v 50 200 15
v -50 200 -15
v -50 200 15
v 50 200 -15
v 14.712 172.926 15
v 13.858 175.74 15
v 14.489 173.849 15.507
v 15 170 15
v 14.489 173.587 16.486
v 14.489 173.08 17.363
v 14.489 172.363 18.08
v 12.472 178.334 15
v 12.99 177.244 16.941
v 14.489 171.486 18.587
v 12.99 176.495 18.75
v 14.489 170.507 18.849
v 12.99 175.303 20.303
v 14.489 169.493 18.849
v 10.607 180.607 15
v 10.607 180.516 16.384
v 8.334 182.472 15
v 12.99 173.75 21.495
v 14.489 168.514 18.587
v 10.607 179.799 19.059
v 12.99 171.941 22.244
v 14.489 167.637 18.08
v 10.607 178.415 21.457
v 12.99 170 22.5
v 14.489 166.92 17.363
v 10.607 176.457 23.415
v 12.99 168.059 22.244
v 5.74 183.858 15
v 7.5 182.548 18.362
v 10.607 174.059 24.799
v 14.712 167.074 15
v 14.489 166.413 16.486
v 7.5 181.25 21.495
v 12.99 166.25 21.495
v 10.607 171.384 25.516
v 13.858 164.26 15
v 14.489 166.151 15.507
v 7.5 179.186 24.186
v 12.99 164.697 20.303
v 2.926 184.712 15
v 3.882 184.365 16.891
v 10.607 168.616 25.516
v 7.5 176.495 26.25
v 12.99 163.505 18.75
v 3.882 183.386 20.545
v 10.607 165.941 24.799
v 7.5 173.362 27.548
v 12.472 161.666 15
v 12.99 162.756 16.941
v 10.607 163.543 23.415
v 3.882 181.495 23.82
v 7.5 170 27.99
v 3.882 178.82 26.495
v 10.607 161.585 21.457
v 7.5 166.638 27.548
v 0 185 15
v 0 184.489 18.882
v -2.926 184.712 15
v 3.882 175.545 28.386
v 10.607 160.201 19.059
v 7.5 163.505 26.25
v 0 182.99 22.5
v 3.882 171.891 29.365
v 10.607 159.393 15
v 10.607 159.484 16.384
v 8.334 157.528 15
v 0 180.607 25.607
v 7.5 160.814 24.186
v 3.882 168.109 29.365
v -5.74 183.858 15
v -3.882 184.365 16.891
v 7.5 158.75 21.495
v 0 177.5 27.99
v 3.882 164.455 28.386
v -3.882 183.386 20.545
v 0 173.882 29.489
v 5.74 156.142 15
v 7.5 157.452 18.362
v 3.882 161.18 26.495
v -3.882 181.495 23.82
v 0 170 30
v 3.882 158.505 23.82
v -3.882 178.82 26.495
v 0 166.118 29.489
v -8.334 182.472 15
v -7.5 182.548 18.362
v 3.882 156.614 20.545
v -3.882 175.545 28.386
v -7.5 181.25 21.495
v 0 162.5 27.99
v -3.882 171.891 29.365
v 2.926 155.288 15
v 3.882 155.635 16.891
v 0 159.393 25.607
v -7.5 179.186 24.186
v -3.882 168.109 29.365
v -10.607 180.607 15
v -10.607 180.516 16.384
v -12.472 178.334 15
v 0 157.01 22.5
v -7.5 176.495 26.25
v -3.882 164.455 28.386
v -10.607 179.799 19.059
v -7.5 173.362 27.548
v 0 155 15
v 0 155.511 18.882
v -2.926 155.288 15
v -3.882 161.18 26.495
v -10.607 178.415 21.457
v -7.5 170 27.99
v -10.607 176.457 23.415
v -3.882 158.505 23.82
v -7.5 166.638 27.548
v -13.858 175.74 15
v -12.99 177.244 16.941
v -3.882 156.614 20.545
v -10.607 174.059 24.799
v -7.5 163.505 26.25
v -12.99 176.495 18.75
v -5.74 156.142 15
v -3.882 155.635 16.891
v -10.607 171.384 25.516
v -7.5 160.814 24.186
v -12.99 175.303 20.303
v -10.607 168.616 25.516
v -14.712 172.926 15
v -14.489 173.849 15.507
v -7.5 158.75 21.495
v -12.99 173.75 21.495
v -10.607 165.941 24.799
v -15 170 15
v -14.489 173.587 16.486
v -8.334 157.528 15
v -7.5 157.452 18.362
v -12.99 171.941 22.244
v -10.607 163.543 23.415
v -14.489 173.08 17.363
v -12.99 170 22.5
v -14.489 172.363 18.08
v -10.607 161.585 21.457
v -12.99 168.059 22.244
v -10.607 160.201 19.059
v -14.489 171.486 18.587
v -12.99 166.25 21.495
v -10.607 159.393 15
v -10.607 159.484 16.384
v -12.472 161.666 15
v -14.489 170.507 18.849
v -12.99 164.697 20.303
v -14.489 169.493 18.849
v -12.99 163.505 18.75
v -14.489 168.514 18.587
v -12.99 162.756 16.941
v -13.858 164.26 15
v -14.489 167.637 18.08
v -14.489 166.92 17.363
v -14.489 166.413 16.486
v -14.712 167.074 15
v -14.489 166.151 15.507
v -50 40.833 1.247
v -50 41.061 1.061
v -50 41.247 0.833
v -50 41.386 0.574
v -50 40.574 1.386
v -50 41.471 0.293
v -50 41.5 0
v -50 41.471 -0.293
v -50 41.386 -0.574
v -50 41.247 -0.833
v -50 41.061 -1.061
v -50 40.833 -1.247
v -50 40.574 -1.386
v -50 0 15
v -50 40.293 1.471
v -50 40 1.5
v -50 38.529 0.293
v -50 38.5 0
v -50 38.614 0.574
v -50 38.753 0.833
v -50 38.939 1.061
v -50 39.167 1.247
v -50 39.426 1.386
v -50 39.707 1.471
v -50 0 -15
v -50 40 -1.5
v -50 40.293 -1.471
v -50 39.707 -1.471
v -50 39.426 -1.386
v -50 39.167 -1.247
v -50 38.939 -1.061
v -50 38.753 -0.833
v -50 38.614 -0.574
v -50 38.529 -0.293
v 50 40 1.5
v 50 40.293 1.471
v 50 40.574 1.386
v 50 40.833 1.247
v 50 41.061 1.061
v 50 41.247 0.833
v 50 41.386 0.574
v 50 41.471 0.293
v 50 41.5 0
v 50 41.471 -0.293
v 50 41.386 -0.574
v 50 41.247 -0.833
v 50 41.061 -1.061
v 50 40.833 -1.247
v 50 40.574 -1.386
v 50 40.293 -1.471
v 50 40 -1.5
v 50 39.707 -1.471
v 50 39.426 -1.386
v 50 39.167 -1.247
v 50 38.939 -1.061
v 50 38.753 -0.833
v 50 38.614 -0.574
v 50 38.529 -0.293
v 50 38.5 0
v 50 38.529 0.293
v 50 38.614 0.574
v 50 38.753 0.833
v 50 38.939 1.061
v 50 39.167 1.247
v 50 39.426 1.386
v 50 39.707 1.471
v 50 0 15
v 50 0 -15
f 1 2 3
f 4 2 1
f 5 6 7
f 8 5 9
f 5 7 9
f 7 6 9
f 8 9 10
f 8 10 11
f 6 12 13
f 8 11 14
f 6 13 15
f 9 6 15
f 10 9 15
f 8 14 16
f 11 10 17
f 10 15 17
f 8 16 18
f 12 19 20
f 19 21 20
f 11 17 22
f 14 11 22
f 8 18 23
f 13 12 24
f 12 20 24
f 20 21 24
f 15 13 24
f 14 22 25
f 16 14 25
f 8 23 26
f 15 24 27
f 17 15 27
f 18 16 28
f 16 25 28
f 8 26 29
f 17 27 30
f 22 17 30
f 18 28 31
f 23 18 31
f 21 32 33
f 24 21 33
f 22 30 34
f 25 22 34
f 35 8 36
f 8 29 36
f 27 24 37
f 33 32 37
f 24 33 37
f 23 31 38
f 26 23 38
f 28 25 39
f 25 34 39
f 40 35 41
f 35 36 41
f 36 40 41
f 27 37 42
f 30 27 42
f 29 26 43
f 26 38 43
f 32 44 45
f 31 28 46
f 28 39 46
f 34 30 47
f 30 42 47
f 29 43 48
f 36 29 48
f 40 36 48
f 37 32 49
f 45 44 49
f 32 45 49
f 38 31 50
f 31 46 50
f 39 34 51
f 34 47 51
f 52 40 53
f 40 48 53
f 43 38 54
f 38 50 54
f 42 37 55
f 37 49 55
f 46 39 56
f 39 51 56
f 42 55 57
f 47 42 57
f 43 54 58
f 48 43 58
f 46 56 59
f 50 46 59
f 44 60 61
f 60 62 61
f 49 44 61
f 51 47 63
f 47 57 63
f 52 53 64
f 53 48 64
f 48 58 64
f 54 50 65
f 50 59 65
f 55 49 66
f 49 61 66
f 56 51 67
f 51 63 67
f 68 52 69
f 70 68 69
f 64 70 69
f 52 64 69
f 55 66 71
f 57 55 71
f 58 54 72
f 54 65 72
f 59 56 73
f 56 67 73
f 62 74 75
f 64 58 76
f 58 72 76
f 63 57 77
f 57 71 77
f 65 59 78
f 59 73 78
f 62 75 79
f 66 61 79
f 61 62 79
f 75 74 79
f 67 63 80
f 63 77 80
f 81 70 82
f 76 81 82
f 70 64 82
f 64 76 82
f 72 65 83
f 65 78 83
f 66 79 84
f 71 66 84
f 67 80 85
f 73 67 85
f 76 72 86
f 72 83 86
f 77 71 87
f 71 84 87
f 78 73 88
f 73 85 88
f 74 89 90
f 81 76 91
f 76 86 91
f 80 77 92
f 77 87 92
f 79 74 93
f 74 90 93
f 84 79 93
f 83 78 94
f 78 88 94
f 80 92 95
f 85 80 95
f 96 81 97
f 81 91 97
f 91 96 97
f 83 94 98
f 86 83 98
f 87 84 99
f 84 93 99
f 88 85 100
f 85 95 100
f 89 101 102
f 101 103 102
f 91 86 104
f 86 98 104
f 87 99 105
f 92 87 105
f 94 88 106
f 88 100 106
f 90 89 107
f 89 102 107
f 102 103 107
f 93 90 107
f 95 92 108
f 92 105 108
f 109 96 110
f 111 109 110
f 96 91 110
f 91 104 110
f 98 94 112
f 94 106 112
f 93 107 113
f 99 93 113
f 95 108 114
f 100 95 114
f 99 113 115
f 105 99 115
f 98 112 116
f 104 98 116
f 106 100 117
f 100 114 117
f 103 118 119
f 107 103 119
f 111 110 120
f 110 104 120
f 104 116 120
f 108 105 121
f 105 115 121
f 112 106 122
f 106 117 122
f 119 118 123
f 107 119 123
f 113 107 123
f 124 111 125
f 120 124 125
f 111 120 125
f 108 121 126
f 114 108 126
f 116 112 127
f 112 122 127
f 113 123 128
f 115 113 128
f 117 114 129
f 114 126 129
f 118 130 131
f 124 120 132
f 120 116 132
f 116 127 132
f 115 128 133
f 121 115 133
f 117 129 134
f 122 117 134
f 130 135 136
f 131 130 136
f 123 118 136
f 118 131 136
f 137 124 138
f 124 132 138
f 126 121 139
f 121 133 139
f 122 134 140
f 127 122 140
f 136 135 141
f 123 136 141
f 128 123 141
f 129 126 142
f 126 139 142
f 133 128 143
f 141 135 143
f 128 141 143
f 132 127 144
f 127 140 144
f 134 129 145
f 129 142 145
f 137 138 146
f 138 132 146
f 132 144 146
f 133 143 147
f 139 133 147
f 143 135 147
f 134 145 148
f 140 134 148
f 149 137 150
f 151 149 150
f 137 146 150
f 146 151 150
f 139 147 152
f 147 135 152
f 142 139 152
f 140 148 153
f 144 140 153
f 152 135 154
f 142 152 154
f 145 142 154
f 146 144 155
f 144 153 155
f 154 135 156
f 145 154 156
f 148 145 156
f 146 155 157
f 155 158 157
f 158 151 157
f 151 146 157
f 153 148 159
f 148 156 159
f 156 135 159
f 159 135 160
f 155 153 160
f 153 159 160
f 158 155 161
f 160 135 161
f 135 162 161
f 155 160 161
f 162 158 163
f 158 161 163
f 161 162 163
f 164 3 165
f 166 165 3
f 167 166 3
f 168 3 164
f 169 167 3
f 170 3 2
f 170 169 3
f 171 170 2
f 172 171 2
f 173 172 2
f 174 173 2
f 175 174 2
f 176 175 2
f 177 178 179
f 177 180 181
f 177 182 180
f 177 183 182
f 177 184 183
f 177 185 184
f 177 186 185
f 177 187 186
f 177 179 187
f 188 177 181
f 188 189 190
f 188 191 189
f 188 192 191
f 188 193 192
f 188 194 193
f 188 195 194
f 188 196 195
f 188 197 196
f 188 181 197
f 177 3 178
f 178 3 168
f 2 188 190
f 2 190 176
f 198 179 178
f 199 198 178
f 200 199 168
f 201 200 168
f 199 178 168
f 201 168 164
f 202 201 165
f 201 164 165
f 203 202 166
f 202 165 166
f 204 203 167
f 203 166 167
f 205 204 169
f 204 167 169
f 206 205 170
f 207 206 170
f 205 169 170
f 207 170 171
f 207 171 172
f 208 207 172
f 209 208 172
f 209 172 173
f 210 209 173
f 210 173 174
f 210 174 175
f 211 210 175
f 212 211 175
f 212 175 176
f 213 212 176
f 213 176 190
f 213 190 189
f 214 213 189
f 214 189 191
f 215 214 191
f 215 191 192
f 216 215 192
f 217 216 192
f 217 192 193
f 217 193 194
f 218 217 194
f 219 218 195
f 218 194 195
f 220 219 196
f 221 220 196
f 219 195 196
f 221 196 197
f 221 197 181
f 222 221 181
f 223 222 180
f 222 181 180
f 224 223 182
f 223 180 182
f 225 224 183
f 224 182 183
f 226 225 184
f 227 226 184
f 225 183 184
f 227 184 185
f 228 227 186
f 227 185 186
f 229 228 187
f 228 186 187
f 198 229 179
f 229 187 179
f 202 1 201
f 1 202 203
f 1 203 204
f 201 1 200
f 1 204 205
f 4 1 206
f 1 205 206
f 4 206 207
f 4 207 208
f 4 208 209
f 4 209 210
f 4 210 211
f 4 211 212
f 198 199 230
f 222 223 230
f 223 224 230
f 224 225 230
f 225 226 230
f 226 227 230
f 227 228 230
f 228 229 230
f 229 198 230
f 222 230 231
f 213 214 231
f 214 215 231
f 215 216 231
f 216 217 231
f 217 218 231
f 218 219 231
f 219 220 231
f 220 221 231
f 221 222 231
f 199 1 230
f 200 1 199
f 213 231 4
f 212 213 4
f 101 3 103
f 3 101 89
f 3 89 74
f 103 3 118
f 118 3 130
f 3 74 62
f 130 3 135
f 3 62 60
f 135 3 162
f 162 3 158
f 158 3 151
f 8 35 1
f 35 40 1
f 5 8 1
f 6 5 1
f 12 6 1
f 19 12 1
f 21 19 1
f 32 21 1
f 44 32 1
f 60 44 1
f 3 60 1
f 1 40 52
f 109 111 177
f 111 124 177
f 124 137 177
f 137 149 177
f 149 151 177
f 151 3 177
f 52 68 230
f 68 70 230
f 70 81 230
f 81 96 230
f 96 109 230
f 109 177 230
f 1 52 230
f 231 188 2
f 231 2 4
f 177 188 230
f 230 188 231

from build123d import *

# Parameters (mm, degrees)
SKETCH_1_W          = 100
SKETCH_1_H          = 30
EXTRUDE_1_DEPTH     = 200
SKETCH_3_R          = 1.5
CUT_EXTRUDE_1_DEPTH = 200


with BuildPart() as part:
    # 草圖1 → 填料-伸長1 (new body)
    with BuildSketch(Plane(origin=(0, 0, 0), x_dir=(1, 0, 0), z_dir=(0, 1, 0))):
        Rectangle(SKETCH_1_W, SKETCH_1_H)
    extrude(amount=EXTRUDE_1_DEPTH)

    # 草圖2 → 旋轉5 (revolve)
    with BuildSketch(Plane.XY.offset(15)):
        with BuildLine():
            Line((-15, 170), (15, 170))
            ThreePointArc((15, 170), (0, 185), (-15, 170))
        make_face()
    revolve(axis=Axis((-33.156754736, 170, 15), (1, 0, 0)))

    # 草圖3 → 除料-伸長1 (cut)
    with BuildSketch(Plane.ZY.offset(50)):
        with Locations((0, 40)):
            Circle(SKETCH_3_R)
    extrude(amount=-CUT_EXTRUDE_1_DEPTH, mode=Mode.SUBTRACT)


solid = part.part
